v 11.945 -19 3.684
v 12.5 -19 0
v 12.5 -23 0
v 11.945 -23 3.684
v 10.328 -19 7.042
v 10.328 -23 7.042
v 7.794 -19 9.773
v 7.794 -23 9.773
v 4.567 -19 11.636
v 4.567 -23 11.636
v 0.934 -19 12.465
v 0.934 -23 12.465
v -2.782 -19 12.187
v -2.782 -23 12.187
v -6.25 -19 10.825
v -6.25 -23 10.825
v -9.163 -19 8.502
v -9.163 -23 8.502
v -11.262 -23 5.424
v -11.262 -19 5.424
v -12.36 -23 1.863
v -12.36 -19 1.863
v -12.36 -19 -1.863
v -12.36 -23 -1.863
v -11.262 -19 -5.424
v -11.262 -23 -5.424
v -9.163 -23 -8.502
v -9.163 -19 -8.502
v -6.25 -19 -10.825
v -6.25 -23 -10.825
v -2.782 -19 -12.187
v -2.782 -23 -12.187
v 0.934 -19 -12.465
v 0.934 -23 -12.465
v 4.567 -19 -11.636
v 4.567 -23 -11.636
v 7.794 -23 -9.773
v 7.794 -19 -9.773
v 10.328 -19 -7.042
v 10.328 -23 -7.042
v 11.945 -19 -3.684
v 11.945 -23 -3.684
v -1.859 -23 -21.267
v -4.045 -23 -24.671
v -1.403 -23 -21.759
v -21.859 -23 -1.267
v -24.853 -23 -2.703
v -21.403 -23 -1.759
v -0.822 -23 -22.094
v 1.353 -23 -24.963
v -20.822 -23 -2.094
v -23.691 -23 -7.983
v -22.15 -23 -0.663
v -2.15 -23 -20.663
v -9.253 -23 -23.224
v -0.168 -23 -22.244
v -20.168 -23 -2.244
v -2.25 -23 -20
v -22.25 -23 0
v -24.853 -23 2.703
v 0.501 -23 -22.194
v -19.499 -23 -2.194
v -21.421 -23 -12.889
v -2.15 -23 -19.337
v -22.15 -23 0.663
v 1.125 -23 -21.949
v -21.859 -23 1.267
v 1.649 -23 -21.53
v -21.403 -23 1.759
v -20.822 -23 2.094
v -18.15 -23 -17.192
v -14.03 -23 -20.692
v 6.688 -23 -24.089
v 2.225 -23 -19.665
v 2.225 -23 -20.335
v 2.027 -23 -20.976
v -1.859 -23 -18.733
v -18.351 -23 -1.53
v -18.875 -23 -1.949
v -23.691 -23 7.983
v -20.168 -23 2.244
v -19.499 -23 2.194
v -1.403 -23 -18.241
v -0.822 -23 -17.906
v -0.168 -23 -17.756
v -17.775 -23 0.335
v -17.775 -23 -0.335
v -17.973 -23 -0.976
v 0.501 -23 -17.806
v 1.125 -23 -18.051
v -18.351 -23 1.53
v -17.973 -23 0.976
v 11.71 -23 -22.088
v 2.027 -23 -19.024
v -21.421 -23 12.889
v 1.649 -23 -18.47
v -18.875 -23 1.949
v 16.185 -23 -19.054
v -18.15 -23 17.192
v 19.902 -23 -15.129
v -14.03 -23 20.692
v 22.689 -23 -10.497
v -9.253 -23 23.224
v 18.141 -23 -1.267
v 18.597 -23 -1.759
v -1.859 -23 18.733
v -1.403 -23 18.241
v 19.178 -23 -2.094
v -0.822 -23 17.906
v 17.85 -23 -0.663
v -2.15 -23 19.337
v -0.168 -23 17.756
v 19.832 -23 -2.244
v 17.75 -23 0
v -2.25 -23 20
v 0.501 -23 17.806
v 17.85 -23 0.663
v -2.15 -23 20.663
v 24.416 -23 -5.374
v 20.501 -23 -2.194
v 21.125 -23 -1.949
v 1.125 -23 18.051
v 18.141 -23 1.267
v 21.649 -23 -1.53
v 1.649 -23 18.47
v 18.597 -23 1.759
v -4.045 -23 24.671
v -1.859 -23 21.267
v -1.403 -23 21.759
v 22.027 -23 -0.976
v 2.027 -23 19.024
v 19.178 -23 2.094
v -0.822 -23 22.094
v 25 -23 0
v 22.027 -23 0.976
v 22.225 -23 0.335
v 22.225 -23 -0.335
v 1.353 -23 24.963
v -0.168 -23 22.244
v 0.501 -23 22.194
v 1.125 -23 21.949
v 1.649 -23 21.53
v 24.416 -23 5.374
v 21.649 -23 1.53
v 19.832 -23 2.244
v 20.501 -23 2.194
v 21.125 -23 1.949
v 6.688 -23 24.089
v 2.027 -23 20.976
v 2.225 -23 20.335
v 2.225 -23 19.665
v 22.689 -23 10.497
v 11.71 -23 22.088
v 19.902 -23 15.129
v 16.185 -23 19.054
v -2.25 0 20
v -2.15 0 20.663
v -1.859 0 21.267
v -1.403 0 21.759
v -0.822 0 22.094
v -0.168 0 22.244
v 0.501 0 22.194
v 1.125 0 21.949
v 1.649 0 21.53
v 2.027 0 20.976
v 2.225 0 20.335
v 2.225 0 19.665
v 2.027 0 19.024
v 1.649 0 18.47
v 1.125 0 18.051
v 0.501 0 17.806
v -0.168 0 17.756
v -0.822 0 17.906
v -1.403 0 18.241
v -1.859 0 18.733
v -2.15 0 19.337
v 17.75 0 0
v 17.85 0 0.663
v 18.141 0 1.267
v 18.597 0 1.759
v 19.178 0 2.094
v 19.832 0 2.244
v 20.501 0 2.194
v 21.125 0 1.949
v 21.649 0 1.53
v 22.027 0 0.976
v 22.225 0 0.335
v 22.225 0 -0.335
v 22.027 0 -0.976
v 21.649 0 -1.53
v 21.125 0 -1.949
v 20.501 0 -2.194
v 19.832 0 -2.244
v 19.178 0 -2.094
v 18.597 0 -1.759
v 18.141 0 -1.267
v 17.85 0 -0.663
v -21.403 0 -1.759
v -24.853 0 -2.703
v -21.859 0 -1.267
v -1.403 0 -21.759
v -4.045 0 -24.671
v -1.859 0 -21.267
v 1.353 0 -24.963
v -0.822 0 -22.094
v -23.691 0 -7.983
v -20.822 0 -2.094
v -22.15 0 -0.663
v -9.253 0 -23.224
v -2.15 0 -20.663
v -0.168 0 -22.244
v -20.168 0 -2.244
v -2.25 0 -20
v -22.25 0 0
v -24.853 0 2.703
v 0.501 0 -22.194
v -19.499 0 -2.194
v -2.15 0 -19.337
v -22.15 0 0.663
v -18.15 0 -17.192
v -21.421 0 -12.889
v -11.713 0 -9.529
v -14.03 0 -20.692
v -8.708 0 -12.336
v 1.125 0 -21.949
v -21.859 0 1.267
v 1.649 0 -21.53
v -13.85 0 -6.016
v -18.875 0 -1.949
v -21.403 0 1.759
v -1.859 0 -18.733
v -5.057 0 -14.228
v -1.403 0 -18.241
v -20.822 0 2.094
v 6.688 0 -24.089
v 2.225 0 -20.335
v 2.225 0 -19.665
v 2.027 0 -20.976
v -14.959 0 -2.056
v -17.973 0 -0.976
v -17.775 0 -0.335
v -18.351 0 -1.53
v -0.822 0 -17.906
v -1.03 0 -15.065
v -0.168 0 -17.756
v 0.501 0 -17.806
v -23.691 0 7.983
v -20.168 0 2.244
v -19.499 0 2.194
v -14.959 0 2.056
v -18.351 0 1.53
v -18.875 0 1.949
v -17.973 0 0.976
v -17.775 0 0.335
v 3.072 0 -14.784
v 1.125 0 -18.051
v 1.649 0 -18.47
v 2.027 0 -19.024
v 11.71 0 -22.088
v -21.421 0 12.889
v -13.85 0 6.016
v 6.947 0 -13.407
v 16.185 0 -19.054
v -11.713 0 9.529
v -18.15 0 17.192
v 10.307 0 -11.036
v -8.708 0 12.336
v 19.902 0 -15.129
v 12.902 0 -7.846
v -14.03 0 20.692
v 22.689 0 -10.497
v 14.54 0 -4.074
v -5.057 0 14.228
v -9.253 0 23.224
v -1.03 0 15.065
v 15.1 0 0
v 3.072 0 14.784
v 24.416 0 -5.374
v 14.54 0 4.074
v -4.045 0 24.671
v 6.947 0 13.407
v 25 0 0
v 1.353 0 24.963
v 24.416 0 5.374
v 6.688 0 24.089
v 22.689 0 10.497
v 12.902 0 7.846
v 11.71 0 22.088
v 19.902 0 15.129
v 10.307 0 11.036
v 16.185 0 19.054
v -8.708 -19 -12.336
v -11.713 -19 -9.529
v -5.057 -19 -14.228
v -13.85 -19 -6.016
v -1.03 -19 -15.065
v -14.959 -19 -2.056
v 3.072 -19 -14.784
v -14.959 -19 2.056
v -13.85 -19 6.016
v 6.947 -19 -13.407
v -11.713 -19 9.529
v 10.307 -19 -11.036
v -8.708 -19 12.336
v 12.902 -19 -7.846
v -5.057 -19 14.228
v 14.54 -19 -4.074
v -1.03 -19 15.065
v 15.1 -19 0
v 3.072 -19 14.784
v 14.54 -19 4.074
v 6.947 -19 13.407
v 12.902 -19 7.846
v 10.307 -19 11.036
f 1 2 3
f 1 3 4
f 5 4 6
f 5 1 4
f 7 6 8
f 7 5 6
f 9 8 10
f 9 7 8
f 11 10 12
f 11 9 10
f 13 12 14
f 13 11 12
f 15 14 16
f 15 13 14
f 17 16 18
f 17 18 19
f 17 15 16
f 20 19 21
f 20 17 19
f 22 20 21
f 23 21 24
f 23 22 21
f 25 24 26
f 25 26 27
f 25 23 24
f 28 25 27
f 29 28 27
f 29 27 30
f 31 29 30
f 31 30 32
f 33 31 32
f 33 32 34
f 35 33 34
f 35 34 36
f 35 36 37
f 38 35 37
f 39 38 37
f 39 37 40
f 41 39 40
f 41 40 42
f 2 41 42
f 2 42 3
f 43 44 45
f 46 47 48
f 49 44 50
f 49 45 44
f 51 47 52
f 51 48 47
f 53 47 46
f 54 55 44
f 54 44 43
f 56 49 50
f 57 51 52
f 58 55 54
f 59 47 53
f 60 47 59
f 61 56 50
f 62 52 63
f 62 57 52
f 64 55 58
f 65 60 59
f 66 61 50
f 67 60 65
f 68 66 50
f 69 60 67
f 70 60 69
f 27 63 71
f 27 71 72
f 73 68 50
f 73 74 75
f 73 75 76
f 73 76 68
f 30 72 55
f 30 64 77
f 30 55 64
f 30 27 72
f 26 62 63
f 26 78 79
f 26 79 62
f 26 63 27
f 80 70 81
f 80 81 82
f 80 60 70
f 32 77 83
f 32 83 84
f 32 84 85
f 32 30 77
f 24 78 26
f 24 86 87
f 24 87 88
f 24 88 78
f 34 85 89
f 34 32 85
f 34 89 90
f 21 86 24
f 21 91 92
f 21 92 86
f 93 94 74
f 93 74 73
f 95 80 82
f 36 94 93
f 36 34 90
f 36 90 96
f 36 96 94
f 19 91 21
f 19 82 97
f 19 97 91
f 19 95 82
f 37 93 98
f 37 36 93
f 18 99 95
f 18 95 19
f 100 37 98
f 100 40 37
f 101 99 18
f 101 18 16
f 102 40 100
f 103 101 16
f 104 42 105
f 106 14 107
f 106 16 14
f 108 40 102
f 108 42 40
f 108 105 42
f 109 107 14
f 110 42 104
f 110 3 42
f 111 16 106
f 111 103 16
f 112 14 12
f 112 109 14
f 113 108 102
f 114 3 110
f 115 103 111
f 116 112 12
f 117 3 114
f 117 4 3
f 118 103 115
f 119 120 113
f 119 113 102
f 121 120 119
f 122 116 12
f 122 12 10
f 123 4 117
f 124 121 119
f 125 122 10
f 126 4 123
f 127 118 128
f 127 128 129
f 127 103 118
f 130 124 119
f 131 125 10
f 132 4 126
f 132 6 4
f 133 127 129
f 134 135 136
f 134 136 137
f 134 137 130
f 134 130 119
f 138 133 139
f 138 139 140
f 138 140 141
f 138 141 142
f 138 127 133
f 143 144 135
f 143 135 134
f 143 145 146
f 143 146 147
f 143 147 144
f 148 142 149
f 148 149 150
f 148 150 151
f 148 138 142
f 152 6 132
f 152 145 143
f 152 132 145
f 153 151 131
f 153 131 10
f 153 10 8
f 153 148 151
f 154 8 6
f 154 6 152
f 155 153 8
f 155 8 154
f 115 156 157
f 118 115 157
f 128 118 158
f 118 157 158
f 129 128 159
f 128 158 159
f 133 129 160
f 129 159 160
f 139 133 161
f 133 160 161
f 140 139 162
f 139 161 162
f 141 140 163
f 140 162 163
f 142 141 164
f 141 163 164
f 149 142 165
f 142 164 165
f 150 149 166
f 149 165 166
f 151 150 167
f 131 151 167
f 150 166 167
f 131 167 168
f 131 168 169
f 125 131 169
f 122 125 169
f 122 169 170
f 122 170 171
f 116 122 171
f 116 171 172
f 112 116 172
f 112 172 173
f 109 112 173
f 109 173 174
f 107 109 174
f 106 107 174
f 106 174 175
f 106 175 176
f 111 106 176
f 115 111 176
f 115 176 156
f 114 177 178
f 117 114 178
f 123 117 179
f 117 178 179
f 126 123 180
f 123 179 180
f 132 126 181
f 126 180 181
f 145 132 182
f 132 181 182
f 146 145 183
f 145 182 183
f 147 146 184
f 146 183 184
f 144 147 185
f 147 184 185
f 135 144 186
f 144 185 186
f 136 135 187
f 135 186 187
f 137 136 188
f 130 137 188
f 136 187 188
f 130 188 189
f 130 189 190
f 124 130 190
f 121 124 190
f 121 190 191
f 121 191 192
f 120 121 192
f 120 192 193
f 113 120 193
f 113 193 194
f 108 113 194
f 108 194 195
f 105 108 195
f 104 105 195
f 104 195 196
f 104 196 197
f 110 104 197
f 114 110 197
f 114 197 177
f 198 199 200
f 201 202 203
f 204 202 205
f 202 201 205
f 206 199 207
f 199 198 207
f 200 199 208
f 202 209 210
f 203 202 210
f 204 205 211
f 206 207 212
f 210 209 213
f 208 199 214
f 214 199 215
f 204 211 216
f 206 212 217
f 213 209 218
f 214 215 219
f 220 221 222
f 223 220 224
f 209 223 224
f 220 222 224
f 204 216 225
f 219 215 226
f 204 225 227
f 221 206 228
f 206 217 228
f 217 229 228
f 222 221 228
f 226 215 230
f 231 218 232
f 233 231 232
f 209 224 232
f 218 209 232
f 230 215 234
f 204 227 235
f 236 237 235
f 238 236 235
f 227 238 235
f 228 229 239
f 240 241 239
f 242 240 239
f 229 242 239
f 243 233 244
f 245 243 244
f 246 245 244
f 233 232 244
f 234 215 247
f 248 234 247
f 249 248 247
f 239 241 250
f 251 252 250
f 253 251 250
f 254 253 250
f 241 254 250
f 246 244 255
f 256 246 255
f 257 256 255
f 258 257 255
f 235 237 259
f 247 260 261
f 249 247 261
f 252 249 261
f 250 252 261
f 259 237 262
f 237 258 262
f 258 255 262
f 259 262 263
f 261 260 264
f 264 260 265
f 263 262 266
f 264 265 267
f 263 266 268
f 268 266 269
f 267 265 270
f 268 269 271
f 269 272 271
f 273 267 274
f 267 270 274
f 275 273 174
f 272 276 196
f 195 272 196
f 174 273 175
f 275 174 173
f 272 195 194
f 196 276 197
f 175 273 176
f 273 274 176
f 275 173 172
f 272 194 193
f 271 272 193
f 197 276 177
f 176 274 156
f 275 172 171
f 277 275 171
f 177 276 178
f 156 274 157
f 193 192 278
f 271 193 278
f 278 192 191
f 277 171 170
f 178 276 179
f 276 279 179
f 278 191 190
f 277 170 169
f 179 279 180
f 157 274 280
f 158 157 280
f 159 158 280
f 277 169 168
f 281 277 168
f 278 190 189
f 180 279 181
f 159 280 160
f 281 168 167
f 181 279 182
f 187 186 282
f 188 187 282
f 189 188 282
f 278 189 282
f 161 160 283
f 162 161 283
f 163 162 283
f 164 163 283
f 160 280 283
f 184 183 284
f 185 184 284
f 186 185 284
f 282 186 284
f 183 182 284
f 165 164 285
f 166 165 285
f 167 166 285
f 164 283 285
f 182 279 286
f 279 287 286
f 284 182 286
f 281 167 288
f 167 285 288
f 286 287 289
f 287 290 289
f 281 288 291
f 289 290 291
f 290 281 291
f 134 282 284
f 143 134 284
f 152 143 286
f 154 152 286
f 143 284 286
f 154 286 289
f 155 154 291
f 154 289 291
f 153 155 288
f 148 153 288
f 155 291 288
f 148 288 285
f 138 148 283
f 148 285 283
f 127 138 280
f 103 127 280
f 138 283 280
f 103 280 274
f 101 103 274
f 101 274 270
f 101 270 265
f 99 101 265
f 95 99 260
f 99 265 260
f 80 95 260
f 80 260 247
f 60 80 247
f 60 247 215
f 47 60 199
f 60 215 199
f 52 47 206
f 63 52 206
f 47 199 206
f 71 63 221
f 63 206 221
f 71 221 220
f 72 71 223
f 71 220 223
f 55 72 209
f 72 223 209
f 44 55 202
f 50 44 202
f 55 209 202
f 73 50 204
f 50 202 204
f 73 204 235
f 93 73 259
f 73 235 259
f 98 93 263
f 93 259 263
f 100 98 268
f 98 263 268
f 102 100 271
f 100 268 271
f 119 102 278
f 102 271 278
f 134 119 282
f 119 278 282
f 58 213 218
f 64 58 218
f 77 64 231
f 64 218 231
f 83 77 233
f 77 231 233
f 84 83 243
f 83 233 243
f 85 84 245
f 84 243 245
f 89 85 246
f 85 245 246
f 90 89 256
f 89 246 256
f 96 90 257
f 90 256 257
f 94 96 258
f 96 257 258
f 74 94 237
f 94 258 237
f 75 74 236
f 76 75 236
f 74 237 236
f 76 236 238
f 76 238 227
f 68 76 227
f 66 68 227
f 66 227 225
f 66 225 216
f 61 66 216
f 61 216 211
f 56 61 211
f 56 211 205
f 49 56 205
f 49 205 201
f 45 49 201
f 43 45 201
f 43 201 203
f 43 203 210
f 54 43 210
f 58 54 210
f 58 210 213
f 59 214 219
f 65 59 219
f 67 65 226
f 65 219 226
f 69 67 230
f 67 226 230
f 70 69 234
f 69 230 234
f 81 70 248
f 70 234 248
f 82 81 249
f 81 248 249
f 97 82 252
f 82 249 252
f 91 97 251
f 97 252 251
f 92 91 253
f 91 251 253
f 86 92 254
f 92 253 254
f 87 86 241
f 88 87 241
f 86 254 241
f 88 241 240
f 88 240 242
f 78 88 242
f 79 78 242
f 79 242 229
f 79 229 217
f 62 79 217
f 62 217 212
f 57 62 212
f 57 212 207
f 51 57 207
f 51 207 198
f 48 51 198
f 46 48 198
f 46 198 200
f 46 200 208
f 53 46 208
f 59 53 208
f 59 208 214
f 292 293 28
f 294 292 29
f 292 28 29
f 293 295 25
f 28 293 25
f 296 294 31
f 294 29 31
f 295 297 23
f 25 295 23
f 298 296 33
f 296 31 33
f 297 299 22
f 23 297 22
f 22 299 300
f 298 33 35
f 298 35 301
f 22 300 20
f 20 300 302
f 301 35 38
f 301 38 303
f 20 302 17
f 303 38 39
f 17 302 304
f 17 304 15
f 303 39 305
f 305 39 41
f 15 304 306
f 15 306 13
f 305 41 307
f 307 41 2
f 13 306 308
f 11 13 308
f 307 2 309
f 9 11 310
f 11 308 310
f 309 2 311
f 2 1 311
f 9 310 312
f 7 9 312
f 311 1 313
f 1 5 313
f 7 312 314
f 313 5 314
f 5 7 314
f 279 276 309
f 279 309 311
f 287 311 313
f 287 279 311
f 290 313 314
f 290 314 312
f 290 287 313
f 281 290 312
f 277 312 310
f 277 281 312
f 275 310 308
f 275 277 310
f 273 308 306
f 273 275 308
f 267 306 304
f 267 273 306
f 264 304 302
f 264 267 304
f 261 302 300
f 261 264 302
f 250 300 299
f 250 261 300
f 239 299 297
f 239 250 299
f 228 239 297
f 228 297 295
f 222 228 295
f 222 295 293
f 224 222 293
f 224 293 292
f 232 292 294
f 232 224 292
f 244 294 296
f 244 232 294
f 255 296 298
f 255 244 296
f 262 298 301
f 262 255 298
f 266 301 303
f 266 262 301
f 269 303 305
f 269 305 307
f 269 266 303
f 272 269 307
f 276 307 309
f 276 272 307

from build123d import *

# Parameters (mm, degrees)
F0_R     = 25
F0_R_2   = 12.5
F1_DEPTH = 23
F2_R     = 15.1
F3_DEPTH = 19
F4_R     = 2.25
F5_DEPTH = 25


with BuildPart() as f1:
    # F0 (on Front) → F1 (new body)
    with BuildSketch(Plane.XZ):
        Circle(F0_R)
        Circle(F0_R_2, mode=Mode.SUBTRACT)
    extrude(amount=F1_DEPTH)

    # F2 (on Front) → F3 (cut)
    with BuildSketch(Plane.XZ):
        Circle(F2_R)
    extrude(amount=F3_DEPTH, mode=Mode.SUBTRACT)

    # F4 (on face) → F5 (cut)
    with BuildSketch(Plane(origin=(0, 0, 0), x_dir=(-1, 0, 0), z_dir=(0, 1, 0))):
        with Locations((20, 0)):
            Circle(F4_R)
        with Locations((0, -20)):
            Circle(F4_R)
        with Locations((-20, 0)):
            Circle(F4_R)
        with Locations((0, 20)):
            Circle(F4_R)
    extrude(amount=-F5_DEPTH, mode=Mode.SUBTRACT)


solid = f1.part
